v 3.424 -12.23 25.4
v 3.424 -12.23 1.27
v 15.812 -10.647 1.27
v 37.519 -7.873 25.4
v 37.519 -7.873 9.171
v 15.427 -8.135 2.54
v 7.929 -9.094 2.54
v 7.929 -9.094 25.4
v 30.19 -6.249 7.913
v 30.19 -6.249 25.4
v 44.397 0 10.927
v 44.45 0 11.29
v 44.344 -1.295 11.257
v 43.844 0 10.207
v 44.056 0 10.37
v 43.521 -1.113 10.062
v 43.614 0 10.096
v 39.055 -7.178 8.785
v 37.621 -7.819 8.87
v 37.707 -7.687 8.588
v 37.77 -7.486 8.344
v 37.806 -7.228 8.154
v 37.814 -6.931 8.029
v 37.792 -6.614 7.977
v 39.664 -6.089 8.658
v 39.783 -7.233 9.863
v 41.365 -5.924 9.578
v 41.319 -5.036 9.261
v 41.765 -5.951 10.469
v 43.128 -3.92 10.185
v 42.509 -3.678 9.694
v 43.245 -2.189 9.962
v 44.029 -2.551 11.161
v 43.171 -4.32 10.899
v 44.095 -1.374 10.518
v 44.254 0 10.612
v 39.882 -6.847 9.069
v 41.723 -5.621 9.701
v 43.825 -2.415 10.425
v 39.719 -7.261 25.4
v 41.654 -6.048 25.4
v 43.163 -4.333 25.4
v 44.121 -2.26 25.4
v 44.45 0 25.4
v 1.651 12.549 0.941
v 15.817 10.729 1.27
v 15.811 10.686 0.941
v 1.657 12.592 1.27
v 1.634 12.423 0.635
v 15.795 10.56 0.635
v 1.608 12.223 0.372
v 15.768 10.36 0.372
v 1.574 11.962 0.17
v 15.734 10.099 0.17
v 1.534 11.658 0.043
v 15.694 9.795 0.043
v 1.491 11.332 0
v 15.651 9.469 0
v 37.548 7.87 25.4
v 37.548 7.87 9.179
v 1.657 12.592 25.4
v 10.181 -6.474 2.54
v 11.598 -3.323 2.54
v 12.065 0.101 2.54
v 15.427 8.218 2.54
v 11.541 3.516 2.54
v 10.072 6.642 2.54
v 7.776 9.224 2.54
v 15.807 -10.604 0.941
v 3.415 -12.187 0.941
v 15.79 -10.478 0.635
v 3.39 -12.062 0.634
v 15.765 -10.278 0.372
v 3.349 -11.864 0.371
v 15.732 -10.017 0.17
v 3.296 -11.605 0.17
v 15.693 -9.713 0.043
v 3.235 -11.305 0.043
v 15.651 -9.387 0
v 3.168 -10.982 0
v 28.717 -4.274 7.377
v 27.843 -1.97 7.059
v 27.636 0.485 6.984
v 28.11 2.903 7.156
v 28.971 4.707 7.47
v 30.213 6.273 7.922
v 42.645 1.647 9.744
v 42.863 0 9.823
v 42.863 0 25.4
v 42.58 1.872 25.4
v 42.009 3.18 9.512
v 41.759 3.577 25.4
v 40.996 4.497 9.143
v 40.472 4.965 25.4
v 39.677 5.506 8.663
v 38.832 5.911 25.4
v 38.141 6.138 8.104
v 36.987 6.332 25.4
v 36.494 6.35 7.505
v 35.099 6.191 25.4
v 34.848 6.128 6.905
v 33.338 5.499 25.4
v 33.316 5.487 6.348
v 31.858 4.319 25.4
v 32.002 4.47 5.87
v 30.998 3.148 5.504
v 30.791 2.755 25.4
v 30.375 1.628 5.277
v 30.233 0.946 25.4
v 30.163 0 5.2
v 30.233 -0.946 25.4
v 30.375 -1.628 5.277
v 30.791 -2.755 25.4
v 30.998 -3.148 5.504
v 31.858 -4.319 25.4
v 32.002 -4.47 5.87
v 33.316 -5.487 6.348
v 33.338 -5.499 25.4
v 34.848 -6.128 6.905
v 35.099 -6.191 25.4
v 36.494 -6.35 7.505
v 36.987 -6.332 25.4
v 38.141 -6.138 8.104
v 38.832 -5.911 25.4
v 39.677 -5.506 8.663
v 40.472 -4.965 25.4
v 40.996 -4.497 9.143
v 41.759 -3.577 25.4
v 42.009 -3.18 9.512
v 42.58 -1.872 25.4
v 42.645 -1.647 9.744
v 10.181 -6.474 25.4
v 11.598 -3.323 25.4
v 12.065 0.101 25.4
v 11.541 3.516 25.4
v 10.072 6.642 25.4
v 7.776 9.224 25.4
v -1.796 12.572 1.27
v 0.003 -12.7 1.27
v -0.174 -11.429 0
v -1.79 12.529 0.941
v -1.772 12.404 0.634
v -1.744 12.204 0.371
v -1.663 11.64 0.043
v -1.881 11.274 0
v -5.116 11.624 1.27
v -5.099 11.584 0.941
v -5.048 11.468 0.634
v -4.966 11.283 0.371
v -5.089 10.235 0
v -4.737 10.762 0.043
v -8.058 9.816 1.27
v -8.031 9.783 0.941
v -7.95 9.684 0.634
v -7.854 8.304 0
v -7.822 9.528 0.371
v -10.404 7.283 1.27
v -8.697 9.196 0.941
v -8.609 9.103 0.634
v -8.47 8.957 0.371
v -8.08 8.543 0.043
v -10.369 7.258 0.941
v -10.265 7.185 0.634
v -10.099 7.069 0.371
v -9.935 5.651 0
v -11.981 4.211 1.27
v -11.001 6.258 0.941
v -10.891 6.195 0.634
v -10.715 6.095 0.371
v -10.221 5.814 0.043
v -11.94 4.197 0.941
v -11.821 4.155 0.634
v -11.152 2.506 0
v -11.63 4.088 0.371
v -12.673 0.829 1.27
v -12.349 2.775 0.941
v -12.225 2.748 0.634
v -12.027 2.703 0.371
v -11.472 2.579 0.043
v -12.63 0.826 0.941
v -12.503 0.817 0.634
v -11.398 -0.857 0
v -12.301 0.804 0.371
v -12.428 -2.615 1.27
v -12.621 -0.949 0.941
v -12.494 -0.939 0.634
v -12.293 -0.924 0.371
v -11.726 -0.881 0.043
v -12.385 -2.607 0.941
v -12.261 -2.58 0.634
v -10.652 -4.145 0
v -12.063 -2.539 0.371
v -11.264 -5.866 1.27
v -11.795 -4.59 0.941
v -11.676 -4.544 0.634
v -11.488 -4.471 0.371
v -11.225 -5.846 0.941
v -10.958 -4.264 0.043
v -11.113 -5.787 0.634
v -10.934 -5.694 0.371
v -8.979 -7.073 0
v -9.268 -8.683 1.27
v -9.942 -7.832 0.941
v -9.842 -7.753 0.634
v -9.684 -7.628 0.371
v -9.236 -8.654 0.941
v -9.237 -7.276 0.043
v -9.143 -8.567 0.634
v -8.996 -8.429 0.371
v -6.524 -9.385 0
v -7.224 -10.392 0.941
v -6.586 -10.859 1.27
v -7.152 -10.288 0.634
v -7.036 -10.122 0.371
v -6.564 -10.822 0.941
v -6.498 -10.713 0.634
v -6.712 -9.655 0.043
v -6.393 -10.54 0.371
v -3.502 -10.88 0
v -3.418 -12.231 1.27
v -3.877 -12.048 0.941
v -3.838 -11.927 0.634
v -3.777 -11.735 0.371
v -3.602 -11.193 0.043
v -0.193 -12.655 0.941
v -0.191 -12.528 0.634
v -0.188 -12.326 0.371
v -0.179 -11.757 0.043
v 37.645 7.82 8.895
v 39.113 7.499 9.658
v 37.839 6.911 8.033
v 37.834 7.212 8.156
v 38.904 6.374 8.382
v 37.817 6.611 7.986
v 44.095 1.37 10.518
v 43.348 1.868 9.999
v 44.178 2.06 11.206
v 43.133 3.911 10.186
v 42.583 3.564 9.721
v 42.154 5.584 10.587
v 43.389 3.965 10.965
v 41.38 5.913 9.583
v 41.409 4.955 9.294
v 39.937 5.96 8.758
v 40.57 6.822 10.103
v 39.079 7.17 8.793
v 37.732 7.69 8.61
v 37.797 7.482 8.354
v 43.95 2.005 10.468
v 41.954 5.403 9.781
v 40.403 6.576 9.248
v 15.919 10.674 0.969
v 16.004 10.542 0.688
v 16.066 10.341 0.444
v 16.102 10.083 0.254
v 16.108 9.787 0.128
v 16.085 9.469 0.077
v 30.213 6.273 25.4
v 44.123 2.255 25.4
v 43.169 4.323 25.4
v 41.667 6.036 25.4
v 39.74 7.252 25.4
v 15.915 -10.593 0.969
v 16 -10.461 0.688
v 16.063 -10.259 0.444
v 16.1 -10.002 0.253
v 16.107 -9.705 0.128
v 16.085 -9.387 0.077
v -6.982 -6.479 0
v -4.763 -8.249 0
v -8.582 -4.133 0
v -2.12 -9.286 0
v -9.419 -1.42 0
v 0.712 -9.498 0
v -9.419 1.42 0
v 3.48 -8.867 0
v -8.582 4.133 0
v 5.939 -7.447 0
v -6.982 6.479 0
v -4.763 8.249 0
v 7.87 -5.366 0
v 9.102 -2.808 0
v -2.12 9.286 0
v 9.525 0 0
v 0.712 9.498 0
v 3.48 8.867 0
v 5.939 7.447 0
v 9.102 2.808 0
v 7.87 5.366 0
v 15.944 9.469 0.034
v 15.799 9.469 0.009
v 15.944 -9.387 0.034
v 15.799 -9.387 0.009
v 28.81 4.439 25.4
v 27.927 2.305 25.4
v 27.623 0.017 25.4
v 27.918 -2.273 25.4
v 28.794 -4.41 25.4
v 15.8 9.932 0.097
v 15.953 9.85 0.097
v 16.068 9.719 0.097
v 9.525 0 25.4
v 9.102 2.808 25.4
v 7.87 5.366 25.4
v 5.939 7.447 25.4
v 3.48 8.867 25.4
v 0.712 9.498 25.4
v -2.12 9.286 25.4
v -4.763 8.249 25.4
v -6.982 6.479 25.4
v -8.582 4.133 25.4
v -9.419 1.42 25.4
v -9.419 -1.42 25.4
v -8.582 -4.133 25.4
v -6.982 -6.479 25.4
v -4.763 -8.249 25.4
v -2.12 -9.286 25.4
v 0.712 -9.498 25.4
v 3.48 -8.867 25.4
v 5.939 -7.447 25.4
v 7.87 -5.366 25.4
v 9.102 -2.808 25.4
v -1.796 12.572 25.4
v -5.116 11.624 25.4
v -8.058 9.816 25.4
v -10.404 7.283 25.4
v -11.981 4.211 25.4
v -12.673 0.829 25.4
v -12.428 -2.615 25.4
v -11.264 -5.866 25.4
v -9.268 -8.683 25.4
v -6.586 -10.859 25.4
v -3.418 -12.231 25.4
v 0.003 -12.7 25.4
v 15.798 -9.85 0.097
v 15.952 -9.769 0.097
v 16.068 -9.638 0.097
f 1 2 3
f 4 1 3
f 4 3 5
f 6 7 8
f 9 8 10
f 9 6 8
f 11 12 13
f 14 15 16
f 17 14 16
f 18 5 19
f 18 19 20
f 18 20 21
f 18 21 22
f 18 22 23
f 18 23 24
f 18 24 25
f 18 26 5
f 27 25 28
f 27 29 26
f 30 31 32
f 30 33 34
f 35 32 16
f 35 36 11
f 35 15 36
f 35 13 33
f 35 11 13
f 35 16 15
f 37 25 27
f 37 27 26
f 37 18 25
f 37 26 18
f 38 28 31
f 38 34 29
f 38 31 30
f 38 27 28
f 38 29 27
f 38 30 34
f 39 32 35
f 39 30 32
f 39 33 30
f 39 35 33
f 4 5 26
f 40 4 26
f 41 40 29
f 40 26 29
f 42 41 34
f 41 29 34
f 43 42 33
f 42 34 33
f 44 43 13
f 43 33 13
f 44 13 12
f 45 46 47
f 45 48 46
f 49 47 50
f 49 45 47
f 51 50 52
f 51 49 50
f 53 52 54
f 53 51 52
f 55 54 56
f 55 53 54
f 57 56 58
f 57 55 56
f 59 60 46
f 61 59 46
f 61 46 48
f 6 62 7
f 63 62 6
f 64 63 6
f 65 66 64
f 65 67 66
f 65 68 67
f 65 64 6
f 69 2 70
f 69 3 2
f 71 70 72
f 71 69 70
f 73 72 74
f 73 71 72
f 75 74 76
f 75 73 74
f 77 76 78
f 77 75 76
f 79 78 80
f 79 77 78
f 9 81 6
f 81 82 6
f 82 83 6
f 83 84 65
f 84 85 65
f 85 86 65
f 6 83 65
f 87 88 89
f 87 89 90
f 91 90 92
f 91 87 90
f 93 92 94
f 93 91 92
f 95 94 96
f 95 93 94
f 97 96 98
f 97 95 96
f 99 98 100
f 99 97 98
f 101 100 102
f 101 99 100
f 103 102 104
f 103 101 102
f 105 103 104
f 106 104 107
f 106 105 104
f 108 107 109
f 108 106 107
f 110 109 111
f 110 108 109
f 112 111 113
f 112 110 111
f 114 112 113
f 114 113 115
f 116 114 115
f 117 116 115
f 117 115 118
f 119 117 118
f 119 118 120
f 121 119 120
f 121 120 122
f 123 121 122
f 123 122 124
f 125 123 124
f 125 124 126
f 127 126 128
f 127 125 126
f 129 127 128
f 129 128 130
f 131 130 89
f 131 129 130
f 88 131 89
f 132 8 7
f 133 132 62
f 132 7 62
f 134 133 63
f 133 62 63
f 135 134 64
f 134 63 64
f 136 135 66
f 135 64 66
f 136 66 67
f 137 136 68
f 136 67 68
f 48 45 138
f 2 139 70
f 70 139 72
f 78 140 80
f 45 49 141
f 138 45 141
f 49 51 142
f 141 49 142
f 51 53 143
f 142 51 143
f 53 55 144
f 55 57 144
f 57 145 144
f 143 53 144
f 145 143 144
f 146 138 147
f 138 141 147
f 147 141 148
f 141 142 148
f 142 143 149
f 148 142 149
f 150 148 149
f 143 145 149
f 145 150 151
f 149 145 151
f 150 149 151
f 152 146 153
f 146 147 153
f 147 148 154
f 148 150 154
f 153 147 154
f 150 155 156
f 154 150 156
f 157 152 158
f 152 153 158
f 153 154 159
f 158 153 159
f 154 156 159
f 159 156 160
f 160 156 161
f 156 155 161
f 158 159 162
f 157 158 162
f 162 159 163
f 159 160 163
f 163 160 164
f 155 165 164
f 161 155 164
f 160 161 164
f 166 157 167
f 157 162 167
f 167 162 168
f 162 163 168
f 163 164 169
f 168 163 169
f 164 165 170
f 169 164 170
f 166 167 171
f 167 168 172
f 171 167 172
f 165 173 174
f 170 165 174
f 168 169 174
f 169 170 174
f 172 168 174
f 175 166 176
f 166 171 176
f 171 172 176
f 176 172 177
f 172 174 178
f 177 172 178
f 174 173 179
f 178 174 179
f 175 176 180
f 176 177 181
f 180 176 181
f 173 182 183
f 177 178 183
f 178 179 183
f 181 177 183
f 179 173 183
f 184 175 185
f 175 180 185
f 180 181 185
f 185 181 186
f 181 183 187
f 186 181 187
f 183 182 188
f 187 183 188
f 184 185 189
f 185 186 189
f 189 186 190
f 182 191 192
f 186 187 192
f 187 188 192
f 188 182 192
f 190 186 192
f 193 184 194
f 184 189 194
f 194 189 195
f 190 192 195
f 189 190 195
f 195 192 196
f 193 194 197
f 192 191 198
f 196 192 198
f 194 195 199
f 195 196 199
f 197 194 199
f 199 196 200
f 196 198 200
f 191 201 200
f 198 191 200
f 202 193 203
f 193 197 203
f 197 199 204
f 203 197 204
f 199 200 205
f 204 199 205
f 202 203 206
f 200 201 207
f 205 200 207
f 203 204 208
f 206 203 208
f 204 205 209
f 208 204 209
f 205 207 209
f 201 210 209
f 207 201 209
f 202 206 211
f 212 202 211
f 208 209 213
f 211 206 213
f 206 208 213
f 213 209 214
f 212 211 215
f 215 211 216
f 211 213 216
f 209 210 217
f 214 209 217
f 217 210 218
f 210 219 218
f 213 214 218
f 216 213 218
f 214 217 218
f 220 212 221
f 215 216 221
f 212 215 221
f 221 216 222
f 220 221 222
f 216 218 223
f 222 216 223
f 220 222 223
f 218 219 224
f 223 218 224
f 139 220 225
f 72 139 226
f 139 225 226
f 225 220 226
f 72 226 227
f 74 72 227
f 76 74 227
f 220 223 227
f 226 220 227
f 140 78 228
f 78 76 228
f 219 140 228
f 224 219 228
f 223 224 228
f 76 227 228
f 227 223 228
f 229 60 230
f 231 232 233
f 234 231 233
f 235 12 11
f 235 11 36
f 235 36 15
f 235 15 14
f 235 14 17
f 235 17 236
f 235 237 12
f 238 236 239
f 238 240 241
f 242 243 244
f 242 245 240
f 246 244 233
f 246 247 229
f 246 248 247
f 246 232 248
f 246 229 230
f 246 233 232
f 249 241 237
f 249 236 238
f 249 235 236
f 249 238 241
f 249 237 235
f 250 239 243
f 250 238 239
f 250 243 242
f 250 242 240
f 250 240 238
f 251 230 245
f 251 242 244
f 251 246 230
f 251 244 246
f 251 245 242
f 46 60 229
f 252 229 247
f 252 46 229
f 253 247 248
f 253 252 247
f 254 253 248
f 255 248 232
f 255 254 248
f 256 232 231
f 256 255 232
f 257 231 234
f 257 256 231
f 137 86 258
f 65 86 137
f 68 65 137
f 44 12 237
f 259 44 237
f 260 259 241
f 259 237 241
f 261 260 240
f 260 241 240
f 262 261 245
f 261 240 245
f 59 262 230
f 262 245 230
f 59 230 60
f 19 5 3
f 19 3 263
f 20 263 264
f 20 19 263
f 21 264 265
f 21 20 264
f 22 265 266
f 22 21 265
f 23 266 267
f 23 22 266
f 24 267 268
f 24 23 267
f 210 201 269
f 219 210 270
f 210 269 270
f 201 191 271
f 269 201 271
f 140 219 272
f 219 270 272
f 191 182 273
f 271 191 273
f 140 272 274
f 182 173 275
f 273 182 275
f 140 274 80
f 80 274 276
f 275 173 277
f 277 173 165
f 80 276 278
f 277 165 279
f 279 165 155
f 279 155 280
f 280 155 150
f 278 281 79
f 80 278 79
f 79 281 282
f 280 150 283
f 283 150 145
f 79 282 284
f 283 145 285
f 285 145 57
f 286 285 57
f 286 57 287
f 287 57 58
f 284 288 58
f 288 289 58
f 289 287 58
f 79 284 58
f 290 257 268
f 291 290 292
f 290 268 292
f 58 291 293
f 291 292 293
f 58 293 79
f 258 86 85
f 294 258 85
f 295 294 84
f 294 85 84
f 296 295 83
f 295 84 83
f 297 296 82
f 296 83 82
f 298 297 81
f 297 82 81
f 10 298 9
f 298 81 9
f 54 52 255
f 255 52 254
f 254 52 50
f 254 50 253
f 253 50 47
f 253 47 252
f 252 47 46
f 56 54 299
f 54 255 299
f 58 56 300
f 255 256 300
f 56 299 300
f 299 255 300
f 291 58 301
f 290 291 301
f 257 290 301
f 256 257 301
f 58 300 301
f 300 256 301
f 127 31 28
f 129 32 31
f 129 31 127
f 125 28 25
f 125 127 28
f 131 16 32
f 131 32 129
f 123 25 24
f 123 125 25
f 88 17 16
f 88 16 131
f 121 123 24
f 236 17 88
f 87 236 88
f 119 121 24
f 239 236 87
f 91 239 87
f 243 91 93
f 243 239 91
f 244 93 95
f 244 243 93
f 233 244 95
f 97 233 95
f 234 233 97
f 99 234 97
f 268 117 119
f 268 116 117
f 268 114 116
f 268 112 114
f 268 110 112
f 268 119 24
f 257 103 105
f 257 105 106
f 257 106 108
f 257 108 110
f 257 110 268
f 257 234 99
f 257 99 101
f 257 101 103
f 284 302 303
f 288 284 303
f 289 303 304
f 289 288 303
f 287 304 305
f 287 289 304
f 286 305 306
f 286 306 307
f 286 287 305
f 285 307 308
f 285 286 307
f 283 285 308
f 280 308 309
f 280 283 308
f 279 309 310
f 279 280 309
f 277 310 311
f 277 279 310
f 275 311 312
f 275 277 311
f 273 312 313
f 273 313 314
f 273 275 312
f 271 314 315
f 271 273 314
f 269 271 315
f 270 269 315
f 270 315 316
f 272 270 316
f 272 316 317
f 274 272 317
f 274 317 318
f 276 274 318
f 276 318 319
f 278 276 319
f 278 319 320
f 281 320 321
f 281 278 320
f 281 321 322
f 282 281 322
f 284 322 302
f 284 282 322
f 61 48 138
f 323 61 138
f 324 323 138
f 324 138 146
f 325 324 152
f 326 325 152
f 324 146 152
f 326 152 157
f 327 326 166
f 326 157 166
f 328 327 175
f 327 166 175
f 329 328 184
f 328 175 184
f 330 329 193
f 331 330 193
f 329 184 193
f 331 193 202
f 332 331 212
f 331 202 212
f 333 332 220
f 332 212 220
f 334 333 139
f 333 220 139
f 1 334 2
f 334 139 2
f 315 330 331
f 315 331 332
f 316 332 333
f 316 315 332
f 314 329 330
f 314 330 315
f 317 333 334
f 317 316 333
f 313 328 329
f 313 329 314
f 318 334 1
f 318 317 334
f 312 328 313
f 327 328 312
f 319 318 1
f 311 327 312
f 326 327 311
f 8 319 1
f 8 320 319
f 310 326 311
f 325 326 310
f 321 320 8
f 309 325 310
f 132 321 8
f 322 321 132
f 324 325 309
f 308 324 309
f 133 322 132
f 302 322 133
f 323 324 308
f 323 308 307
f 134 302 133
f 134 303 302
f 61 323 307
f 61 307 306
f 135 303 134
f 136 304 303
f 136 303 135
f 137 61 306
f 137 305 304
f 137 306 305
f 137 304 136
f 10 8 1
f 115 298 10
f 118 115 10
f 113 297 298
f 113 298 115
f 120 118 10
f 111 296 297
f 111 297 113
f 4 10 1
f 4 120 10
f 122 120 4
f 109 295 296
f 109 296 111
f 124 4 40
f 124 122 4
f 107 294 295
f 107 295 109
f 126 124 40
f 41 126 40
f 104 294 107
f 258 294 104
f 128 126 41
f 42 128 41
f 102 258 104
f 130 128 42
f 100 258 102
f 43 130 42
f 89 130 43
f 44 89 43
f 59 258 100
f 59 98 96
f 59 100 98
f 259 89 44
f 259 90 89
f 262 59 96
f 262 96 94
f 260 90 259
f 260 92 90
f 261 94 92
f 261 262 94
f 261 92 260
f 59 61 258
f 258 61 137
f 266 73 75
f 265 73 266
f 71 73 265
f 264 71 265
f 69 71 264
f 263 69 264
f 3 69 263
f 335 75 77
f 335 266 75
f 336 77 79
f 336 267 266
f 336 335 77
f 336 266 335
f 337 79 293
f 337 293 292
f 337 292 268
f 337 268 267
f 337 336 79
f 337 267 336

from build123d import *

# Parameters (mm, degrees)
F0_R          = 9.525
F0_R_2        = 6.35
F1_DEPTH      = 25.4
F3_DEPTH      = 25.4
F3_DEPTH_BACK = 25.4
F4_R          = 1.27
F5_T          = -2.54


with BuildPart() as f1:
    # F0 (on Top) → F1 (new body)
    with BuildSketch(Plane.XY):
        with BuildLine():
            ThreePointArc((1.6565217391, 12.5915025207), (9.5479795268, 8.3741320121), (12.7, 0))
            ThreePointArc((12.7, 0), (10.1185149246, -7.6750020013), (3.4235187843, -12.229861779))
            Line((3.4235187843, -12.229861779), (37.5185084512, -7.8734905376))
            ThreePointArc((37.5185084512, -7.8734905376), (28.5750137634, 0.0147815331), (37.547826087, 7.8696890754))
            Line((37.547826087, 7.8696890754), (1.6565217391, 12.5915025207))
        make_face()
        with BuildLine():
            ThreePointArc((3.4235187843, -12.229861779), (10.1185149246, -7.6750020013), (12.7, 0))
            ThreePointArc((12.7, 0), (9.5479795268, 8.3741320121), (1.6565217391, 12.5915025207))
            ThreePointArc((1.6565217391, 12.5915025207), (-12.6679412042, -0.9018124228), (3.4235187843, -12.229861779))
        make_face()
        Circle(F0_R, mode=Mode.SUBTRACT)
        with BuildLine():
            ThreePointArc((44.45, 0), (42.4799872042, 5.2338325076), (37.547826087, 7.8696890754))
            ThreePointArc((37.547826087, 7.8696890754), (28.5750137634, 0.0147815331), (37.5185084512, -7.8734905376))
            ThreePointArc((37.5185084512, -7.8734905376), (42.4702302025, -5.244936328), (44.45, 0))
        make_face()
        with Locations((36.5125, 0)):
            Circle(F0_R_2, mode=Mode.SUBTRACT)
    extrude(amount=F1_DEPTH)

    # F2 (on Front) → F3 (cut, two sides)
    with BuildSketch(Plane.XZ) as f3_sk:
        Polygon((44.45, 10.4004494442), (15.875, 0), (44.45, 0), align=None)
    extrude(amount=-F3_DEPTH, mode=Mode.SUBTRACT)
    extrude(f3_sk.sketch, amount=F3_DEPTH_BACK, mode=Mode.SUBTRACT)

    # F4
    f4_edges = [f1.edges().sort_by_distance(p)[0] for p in [
        (26.711413, 9.295314, 3.944132),
        (-12.667941, -0.901812, 0),
        (8.765761, 11.65622, 0),
        (9.649259, -11.434389, 0),
        (15.875, 0.041011, 0),
    ]]
    fillet(f4_edges, radius=F4_R)

    # F5
    f5_openings = [f1.faces().sort_by_distance(p)[0] for p in [
        (15.37002, 0.035477, 25.4),
    ]]
    offset(amount=F5_T, openings=f5_openings)


solid = f1.part
